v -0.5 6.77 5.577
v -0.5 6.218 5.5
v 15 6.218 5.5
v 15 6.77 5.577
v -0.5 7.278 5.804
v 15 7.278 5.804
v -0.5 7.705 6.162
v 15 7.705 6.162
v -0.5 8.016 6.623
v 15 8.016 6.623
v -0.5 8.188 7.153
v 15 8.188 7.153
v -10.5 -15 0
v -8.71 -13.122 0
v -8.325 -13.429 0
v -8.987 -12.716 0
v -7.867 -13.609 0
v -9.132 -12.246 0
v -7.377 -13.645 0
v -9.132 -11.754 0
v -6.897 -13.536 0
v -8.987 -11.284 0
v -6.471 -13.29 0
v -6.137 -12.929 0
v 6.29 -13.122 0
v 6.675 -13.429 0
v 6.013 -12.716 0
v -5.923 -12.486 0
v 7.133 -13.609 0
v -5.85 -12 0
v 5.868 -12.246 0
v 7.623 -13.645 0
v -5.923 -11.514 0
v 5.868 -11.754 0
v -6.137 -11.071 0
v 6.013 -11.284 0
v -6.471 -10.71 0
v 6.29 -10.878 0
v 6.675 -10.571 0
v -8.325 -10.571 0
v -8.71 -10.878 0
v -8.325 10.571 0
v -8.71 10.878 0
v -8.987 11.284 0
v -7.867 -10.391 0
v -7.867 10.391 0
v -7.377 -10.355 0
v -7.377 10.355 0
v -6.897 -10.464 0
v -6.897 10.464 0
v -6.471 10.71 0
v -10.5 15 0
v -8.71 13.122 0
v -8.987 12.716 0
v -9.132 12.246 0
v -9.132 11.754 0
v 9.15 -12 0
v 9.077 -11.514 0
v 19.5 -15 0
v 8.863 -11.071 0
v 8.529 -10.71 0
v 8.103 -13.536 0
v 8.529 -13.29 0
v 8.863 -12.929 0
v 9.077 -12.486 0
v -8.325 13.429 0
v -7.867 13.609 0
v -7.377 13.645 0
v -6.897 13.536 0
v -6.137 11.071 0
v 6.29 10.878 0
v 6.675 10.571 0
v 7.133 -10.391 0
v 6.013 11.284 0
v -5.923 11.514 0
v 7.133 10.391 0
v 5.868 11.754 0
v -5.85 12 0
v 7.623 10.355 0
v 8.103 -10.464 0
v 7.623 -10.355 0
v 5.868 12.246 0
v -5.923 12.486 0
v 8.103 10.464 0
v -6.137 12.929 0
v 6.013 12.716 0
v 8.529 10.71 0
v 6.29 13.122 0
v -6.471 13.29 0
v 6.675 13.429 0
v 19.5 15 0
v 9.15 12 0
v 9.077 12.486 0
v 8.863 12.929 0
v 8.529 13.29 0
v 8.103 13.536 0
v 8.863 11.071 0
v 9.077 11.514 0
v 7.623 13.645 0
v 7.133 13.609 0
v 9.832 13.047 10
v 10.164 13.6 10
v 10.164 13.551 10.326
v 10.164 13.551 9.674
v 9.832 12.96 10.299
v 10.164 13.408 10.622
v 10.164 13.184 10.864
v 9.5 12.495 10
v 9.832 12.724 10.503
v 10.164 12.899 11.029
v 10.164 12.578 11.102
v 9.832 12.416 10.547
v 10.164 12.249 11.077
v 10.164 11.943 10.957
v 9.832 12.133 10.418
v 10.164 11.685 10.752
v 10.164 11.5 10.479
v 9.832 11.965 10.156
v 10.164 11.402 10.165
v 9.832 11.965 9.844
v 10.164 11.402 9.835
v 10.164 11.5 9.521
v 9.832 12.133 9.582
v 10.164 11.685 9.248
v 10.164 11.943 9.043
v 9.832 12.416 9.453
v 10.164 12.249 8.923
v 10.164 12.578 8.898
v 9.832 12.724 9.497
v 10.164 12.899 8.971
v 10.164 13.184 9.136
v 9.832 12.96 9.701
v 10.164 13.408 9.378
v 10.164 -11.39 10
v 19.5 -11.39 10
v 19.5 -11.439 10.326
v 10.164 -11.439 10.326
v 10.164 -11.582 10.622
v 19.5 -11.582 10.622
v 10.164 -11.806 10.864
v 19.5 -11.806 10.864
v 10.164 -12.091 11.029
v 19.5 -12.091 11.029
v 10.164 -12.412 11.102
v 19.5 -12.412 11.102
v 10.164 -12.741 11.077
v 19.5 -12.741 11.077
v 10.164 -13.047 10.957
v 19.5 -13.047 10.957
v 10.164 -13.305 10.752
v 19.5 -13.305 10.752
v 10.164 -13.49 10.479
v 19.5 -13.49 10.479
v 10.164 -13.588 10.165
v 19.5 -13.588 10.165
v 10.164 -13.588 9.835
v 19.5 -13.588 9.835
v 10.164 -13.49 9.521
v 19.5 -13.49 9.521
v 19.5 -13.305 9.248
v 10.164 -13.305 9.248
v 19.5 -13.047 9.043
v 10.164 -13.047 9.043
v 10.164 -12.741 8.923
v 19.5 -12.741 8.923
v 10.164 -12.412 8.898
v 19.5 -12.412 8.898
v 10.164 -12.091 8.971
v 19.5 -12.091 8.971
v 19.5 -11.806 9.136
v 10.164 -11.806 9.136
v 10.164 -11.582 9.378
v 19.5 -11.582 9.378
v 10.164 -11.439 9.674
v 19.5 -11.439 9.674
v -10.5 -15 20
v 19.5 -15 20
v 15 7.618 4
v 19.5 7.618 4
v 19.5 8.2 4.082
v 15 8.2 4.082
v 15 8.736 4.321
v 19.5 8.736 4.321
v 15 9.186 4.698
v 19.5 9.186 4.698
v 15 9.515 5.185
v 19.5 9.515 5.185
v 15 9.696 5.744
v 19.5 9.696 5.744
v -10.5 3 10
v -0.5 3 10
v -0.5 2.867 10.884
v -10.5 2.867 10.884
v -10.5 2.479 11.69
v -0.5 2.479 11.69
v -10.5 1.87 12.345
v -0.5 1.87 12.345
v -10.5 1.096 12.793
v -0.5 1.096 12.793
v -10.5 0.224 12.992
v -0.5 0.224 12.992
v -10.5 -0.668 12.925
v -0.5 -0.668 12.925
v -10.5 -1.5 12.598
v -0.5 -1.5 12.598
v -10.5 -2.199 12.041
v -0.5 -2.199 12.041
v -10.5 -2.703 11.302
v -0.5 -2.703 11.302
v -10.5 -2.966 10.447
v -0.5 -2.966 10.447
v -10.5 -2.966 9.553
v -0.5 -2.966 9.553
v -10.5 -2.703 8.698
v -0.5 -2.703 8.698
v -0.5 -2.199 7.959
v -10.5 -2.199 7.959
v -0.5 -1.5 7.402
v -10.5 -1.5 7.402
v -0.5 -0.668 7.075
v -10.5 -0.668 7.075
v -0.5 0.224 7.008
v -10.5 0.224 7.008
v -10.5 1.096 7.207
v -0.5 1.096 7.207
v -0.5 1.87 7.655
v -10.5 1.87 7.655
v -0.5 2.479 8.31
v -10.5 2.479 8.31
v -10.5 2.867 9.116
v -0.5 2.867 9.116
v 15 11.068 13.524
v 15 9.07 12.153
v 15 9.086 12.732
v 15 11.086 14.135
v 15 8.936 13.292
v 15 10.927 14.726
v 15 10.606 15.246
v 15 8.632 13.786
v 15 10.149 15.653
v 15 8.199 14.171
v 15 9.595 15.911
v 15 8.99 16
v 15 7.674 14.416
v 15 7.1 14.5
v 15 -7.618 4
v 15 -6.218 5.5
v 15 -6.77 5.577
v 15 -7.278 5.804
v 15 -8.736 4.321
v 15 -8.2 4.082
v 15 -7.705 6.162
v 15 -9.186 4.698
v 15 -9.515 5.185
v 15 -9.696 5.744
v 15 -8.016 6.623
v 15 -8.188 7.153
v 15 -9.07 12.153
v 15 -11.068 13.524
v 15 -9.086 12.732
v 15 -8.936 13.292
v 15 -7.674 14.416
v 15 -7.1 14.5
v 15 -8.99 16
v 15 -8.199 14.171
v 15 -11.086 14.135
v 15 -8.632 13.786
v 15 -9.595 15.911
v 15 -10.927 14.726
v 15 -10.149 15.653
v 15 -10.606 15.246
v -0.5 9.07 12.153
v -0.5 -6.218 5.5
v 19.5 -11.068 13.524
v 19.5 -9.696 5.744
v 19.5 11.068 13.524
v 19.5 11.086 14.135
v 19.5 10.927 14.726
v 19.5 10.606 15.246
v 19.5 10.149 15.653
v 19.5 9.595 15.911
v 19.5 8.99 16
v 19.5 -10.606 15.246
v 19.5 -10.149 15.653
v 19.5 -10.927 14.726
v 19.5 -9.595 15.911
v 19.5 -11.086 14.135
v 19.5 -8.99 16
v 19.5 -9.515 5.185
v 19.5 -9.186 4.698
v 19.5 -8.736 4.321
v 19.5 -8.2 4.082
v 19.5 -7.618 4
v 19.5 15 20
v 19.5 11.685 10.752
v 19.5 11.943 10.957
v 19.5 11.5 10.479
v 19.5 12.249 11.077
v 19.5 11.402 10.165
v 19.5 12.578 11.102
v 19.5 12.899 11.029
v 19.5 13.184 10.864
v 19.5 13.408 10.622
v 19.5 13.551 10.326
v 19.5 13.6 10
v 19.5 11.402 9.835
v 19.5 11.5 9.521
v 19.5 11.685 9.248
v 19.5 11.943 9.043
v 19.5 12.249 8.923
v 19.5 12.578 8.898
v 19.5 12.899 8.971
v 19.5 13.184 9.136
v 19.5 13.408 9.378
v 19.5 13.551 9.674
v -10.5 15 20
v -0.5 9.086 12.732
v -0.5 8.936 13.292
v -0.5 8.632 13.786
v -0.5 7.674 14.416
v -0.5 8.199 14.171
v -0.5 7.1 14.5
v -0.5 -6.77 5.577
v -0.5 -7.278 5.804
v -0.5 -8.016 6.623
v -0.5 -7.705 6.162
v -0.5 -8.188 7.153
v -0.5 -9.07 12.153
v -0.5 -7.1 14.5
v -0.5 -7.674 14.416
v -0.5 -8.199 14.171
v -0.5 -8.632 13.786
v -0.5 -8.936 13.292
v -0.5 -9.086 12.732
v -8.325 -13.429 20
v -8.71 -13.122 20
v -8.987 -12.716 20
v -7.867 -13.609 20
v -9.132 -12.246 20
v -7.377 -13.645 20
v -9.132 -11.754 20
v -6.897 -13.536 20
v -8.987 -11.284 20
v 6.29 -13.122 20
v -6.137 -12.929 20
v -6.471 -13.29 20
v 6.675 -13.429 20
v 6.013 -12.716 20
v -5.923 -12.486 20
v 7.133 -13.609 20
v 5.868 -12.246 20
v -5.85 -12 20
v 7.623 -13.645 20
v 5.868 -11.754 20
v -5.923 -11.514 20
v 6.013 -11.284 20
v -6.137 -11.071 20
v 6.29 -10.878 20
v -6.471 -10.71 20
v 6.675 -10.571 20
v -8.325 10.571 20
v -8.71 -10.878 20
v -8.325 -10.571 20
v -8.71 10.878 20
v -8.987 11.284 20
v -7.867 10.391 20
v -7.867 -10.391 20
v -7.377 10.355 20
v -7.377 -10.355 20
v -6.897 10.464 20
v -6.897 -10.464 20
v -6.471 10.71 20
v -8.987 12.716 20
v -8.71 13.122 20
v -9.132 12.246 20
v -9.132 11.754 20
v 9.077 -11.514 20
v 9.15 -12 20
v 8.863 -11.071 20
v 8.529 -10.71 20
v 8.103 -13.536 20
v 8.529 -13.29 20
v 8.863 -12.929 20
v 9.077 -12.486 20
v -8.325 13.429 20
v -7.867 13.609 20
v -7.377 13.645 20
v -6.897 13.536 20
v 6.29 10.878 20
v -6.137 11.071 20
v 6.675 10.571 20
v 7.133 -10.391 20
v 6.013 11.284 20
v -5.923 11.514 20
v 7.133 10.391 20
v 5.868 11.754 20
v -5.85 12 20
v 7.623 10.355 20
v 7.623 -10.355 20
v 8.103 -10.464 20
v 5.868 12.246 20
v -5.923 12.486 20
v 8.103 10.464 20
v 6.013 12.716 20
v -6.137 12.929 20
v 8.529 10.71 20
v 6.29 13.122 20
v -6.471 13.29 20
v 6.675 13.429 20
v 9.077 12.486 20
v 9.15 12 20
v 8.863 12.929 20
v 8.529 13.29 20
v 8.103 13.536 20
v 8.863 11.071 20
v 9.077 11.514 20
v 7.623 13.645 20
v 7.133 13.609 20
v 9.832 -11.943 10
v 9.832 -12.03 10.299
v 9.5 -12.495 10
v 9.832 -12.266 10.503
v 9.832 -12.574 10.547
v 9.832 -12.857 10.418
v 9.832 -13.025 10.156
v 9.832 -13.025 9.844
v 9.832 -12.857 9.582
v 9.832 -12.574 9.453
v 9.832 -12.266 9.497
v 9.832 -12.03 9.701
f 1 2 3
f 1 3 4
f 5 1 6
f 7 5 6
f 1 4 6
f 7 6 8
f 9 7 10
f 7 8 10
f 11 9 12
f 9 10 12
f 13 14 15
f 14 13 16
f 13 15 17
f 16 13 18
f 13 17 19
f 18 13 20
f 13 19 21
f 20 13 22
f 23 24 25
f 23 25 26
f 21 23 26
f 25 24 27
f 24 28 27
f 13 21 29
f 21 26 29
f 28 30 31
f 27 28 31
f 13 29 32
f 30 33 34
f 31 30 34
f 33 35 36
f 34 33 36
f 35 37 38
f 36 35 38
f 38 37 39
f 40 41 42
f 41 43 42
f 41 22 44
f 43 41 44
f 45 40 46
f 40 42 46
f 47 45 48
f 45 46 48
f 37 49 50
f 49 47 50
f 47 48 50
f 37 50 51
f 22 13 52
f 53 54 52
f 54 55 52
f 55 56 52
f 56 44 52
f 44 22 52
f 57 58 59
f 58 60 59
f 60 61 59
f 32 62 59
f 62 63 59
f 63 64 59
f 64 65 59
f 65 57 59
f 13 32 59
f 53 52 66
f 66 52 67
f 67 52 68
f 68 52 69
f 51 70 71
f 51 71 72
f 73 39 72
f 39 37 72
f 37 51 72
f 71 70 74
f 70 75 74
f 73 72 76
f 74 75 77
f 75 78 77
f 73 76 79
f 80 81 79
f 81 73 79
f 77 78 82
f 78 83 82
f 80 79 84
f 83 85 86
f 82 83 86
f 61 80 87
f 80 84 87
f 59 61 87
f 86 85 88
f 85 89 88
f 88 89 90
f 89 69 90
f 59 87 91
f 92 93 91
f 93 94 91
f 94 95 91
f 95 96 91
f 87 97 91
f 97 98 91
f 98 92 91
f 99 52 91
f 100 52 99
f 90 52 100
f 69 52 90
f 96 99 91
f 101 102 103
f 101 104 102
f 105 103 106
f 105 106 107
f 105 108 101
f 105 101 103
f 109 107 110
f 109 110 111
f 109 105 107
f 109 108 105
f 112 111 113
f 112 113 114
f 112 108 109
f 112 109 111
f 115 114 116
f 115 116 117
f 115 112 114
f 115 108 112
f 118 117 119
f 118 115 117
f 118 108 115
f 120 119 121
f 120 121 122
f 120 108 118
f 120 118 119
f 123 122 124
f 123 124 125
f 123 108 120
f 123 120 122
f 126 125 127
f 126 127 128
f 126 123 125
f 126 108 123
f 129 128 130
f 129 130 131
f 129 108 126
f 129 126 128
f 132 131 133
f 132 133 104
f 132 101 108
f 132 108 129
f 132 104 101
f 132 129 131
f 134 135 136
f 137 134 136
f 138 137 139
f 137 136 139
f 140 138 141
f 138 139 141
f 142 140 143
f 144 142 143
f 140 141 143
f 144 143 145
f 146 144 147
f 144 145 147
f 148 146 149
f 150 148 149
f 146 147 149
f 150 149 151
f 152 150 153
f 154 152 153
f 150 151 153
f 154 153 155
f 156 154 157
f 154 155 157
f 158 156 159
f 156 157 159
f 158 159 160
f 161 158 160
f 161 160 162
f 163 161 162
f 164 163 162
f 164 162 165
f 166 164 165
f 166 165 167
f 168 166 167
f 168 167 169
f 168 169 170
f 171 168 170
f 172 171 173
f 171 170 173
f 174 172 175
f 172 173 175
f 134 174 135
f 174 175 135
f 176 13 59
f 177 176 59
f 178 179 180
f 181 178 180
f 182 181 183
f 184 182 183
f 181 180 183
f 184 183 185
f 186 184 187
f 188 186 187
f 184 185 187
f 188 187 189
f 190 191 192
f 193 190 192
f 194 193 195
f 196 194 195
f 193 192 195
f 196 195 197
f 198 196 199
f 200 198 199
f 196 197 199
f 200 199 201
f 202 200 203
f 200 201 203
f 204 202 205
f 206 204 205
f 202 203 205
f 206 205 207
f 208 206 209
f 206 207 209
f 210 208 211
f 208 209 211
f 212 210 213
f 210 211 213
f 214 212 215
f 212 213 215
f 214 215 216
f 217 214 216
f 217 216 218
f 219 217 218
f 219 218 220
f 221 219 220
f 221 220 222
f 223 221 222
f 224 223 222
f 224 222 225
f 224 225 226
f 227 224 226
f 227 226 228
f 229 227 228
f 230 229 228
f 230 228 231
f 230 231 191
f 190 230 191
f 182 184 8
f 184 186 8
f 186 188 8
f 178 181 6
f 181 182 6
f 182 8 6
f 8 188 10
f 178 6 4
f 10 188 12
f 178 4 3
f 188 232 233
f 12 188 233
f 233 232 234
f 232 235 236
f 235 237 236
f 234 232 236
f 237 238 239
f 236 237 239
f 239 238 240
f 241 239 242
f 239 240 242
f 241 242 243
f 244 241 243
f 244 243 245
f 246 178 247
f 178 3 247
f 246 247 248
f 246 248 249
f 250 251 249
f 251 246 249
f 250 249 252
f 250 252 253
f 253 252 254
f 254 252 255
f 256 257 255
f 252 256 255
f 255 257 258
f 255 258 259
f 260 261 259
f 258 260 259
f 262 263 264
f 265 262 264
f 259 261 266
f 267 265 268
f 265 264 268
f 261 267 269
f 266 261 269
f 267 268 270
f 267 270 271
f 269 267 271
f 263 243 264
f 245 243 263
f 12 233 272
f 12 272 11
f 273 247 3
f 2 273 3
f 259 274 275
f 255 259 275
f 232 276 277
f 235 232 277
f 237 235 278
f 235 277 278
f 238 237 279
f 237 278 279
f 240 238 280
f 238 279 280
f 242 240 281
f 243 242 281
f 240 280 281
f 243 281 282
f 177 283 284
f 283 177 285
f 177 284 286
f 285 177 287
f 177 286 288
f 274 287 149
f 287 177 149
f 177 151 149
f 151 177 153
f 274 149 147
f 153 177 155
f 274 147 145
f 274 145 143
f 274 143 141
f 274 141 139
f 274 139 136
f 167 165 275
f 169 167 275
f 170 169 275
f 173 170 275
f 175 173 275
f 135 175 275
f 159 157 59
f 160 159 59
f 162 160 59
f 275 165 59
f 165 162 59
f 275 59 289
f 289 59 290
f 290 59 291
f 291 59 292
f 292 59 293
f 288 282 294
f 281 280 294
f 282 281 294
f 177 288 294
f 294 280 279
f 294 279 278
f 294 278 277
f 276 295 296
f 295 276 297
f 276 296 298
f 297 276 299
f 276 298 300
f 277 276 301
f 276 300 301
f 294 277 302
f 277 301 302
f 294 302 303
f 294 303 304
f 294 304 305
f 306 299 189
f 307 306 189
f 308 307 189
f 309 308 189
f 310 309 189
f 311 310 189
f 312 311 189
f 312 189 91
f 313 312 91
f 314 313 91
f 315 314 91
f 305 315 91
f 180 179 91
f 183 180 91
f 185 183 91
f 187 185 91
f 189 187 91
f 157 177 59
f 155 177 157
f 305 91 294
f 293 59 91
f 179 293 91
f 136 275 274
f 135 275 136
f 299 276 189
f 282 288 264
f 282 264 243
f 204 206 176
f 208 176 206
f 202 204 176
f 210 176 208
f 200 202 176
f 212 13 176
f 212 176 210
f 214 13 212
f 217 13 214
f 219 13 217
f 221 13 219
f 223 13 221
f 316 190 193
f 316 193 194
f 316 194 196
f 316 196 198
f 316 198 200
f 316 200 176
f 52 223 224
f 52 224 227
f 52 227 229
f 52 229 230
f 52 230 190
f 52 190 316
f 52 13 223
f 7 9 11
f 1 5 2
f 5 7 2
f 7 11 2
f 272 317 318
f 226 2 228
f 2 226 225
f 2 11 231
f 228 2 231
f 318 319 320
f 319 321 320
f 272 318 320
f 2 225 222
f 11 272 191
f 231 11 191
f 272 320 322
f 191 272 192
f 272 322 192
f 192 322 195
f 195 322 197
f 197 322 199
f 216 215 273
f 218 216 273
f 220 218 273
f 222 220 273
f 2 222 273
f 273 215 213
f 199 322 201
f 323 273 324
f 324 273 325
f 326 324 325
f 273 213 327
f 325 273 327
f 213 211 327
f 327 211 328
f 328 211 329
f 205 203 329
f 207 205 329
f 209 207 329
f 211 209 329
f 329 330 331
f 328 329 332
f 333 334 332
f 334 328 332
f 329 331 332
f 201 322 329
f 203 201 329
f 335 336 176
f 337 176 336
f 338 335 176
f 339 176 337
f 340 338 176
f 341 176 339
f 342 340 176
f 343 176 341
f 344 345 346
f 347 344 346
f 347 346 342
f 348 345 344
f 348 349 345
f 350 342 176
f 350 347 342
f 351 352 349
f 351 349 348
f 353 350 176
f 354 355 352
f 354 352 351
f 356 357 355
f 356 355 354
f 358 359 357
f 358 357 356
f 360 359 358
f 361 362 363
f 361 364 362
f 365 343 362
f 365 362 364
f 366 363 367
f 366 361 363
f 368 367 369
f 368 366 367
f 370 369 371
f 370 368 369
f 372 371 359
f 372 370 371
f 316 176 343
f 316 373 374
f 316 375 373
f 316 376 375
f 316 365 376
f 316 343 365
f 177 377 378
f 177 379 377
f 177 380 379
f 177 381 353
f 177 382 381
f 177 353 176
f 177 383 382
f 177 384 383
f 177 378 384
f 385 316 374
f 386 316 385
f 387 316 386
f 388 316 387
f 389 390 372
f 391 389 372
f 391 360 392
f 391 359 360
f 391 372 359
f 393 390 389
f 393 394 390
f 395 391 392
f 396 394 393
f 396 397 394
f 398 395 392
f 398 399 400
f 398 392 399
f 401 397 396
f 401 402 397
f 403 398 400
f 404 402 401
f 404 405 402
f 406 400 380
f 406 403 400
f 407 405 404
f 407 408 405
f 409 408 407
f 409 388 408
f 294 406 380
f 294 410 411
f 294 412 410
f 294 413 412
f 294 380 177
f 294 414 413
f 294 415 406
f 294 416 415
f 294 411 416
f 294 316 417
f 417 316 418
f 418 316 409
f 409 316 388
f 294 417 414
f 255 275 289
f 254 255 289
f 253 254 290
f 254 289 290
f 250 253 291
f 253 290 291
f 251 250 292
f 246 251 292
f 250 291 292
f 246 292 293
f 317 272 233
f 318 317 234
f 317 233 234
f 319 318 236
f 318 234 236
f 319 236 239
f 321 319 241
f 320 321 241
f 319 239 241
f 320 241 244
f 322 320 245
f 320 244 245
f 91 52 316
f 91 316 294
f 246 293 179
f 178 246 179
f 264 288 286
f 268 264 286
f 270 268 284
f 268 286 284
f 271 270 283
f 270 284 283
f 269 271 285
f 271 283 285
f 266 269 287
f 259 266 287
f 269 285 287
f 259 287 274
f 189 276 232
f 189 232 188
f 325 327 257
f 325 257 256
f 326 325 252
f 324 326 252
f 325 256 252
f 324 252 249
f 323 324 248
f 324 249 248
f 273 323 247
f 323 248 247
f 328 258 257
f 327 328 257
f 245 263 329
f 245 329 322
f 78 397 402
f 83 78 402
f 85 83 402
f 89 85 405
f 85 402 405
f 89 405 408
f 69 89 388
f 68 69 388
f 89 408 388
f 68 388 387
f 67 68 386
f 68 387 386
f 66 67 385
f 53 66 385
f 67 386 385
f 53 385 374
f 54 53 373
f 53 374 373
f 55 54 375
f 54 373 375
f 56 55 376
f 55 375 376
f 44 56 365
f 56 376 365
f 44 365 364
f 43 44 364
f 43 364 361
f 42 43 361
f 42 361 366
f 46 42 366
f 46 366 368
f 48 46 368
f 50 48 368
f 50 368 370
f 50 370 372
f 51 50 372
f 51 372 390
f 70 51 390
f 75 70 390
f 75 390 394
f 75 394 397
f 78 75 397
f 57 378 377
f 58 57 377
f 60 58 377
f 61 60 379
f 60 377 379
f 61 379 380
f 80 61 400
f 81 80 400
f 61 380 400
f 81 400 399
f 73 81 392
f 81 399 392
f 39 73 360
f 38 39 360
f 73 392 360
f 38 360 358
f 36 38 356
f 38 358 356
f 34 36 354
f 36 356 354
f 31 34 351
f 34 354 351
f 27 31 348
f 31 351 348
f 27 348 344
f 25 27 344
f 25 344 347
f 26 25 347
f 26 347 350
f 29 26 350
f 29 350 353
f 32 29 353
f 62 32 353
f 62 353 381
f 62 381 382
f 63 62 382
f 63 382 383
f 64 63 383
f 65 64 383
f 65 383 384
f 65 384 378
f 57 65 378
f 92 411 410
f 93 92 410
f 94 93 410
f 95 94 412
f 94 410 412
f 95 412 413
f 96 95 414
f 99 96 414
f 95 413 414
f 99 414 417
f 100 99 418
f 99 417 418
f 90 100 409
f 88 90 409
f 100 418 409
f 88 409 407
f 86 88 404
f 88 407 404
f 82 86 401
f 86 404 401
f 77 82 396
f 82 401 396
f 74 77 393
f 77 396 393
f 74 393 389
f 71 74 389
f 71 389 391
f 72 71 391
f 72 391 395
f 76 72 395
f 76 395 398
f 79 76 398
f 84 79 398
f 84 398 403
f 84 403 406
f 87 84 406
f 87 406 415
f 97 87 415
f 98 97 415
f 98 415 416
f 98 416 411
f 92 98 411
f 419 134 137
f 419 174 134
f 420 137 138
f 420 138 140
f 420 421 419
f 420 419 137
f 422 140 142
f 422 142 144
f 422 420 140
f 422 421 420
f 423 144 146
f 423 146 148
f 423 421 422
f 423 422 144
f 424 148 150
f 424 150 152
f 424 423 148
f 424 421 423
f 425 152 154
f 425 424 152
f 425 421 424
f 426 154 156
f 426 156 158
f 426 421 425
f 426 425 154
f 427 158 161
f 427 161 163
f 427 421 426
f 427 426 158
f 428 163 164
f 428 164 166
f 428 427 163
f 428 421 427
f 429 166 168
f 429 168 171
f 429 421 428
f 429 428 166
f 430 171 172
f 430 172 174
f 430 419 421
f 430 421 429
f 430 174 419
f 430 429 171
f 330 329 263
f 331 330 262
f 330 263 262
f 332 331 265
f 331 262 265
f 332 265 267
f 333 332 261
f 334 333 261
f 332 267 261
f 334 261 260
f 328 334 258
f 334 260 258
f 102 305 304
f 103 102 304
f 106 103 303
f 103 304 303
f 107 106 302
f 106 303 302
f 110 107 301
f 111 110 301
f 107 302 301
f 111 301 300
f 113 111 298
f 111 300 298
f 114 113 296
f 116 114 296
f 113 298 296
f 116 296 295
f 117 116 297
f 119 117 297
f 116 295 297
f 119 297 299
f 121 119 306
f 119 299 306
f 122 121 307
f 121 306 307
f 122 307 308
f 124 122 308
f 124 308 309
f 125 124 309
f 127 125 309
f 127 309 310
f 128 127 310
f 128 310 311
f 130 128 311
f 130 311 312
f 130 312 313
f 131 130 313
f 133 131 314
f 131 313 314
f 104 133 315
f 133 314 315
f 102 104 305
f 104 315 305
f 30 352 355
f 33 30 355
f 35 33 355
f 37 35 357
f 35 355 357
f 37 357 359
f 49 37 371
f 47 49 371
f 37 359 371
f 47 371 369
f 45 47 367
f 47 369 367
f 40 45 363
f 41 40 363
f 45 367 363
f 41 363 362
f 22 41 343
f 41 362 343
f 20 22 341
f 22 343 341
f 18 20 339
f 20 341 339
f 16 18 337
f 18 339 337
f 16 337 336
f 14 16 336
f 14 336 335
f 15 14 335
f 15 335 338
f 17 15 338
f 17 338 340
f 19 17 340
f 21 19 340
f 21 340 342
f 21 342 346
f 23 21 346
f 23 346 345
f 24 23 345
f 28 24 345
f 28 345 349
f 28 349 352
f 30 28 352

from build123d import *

# Parameters (mm, degrees)
SKETCH001_W     = 30
SKETCH001_H     = 30
PAD_DEPTH       = 20
POCKET_DEPTH    = 4.5
POCKET001_DEPTH = 20
SKETCH004_R     = 3
HOLE001_DEPTH   = 30.001
SKETCH005_R     = 1.1049
HOLE002_DEPTH   = 9.336109
HOLE002_TIPS_R  = 1.1049
SKETCH_R        = 1.65
HOLE_DEPTH      = 20.001


with BuildPart() as part:
    # Sketch001 → Pad (new body)
    with BuildSketch(Plane.XY):
        with Locations((4.5, 0)):
            Rectangle(SKETCH001_W, SKETCH001_H)
    extrude(amount=PAD_DEPTH)

    # Sketch002 (on DatumPlane) → Pocket (cut)
    with BuildSketch(Plane(origin=(19.5, 0, 10), x_dir=(0, 1, 0), z_dir=(1, 0, 0))):
        with BuildLine():
            Line((-8.99, 6), (8.99, 6))
            ThreePointArc((11.067944, 3.523602), (10.606354, 5.246282), (8.99, 6))
            Line((11.067944, 3.523602), (9.69612, -4.256398))
            ThreePointArc((7.618176, -6), (8.974458, -5.506354), (9.69612, -4.256398))
            Line((-7.618176, -6), (7.618176, -6))
            ThreePointArc((-9.69612, -4.256398), (-8.974458, -5.506354), (-7.618176, -6))
            Line((-11.067944, 3.523602), (-9.69612, -4.256398))
            ThreePointArc((-8.99, 6), (-10.606354, 5.246282), (-11.067944, 3.523602))
        make_face()
    extrude(amount=-POCKET_DEPTH, mode=Mode.SUBTRACT)

    # Sketch003 (on DatumPlane) → Pocket001 (cut)
    with BuildSketch(Plane(origin=(19.5, 0, 10), x_dir=(0, 1, 0), z_dir=(1, 0, 0))):
        with BuildLine():
            Line((-7.1, 4.5), (7.1, 4.5))
            ThreePointArc((9.069616, 2.152704), (8.632089, 3.785575), (7.1, 4.5))
            Line((9.069616, 2.152704), (8.187981, -2.847296))
            ThreePointArc((6.218365, -4.5), (7.50394, -4.032089), (8.187981, -2.847296))
            Line((-6.218365, -4.5), (6.218365, -4.5))
            ThreePointArc((-8.187981, -2.847296), (-7.50394, -4.032089), (-6.218365, -4.5))
            Line((-9.069616, 2.152704), (-8.187981, -2.847296))
            ThreePointArc((-7.1, 4.5), (-8.632089, 3.785575), (-9.069616, 2.152704))
        make_face()
    extrude(amount=-POCKET001_DEPTH, mode=Mode.SUBTRACT)

    # Sketch004 (on DatumPlane) → Hole001 (cut, through all)
    with BuildSketch(Plane(origin=(19.5, 0, 10), x_dir=(0, 1, 0), z_dir=(1, 0, 0))):
        Circle(SKETCH004_R)
    extrude(amount=-HOLE001_DEPTH, mode=Mode.SUBTRACT)

    # Sketch005 (on DatumPlane) → Hole002 (cut)
    with BuildSketch(Plane(origin=(19.5, 0, 10), x_dir=(0, 1, 0), z_dir=(1, 0, 0))):
        with Locations((-12.495, 0)):
            Circle(SKETCH005_R)
        with Locations((12.495, 0)):
            Circle(SKETCH005_R)
    extrude(amount=-HOLE002_DEPTH, mode=Mode.SUBTRACT)

    # Hole002 tips → Hole002 tip 1 section 0
    with BuildSketch(Plane(origin=(10.163891, 0, 10), x_dir=(0, 1, 0), z_dir=(1, 0, 0)), mode=Mode.PRIVATE) as hole002_tip_1_s0:
        with Locations((-12.495, 0)):
            Circle(HOLE002_TIPS_R)
    loft([hole002_tip_1_s0.sketch, Vertex(9.5, -12.495, 10)], mode=Mode.SUBTRACT)

    # Hole002 tips → Hole002 tip 2 section 0
    with BuildSketch(Plane(origin=(10.163891, 0, 10), x_dir=(0, 1, 0), z_dir=(1, 0, 0)), mode=Mode.PRIVATE) as hole002_tip_2_s0:
        with Locations((12.495, 0)):
            Circle(HOLE002_TIPS_R)
    loft([hole002_tip_2_s0.sketch, Vertex(9.5, 12.495, 10)], mode=Mode.SUBTRACT)

    # Sketch (on DatumPlane) → Hole (cut, through all)
    with BuildSketch(Plane.XY.offset(20)):
        with Locations((-7.5, 12)):
            Circle(SKETCH_R)
        with Locations((7.5, 12)):
            Circle(SKETCH_R)
        with Locations((7.5, -12)):
            Circle(SKETCH_R)
        with Locations((-7.5, -12)):
            Circle(SKETCH_R)
    extrude(amount=-HOLE_DEPTH, mode=Mode.SUBTRACT)


solid = part.part
